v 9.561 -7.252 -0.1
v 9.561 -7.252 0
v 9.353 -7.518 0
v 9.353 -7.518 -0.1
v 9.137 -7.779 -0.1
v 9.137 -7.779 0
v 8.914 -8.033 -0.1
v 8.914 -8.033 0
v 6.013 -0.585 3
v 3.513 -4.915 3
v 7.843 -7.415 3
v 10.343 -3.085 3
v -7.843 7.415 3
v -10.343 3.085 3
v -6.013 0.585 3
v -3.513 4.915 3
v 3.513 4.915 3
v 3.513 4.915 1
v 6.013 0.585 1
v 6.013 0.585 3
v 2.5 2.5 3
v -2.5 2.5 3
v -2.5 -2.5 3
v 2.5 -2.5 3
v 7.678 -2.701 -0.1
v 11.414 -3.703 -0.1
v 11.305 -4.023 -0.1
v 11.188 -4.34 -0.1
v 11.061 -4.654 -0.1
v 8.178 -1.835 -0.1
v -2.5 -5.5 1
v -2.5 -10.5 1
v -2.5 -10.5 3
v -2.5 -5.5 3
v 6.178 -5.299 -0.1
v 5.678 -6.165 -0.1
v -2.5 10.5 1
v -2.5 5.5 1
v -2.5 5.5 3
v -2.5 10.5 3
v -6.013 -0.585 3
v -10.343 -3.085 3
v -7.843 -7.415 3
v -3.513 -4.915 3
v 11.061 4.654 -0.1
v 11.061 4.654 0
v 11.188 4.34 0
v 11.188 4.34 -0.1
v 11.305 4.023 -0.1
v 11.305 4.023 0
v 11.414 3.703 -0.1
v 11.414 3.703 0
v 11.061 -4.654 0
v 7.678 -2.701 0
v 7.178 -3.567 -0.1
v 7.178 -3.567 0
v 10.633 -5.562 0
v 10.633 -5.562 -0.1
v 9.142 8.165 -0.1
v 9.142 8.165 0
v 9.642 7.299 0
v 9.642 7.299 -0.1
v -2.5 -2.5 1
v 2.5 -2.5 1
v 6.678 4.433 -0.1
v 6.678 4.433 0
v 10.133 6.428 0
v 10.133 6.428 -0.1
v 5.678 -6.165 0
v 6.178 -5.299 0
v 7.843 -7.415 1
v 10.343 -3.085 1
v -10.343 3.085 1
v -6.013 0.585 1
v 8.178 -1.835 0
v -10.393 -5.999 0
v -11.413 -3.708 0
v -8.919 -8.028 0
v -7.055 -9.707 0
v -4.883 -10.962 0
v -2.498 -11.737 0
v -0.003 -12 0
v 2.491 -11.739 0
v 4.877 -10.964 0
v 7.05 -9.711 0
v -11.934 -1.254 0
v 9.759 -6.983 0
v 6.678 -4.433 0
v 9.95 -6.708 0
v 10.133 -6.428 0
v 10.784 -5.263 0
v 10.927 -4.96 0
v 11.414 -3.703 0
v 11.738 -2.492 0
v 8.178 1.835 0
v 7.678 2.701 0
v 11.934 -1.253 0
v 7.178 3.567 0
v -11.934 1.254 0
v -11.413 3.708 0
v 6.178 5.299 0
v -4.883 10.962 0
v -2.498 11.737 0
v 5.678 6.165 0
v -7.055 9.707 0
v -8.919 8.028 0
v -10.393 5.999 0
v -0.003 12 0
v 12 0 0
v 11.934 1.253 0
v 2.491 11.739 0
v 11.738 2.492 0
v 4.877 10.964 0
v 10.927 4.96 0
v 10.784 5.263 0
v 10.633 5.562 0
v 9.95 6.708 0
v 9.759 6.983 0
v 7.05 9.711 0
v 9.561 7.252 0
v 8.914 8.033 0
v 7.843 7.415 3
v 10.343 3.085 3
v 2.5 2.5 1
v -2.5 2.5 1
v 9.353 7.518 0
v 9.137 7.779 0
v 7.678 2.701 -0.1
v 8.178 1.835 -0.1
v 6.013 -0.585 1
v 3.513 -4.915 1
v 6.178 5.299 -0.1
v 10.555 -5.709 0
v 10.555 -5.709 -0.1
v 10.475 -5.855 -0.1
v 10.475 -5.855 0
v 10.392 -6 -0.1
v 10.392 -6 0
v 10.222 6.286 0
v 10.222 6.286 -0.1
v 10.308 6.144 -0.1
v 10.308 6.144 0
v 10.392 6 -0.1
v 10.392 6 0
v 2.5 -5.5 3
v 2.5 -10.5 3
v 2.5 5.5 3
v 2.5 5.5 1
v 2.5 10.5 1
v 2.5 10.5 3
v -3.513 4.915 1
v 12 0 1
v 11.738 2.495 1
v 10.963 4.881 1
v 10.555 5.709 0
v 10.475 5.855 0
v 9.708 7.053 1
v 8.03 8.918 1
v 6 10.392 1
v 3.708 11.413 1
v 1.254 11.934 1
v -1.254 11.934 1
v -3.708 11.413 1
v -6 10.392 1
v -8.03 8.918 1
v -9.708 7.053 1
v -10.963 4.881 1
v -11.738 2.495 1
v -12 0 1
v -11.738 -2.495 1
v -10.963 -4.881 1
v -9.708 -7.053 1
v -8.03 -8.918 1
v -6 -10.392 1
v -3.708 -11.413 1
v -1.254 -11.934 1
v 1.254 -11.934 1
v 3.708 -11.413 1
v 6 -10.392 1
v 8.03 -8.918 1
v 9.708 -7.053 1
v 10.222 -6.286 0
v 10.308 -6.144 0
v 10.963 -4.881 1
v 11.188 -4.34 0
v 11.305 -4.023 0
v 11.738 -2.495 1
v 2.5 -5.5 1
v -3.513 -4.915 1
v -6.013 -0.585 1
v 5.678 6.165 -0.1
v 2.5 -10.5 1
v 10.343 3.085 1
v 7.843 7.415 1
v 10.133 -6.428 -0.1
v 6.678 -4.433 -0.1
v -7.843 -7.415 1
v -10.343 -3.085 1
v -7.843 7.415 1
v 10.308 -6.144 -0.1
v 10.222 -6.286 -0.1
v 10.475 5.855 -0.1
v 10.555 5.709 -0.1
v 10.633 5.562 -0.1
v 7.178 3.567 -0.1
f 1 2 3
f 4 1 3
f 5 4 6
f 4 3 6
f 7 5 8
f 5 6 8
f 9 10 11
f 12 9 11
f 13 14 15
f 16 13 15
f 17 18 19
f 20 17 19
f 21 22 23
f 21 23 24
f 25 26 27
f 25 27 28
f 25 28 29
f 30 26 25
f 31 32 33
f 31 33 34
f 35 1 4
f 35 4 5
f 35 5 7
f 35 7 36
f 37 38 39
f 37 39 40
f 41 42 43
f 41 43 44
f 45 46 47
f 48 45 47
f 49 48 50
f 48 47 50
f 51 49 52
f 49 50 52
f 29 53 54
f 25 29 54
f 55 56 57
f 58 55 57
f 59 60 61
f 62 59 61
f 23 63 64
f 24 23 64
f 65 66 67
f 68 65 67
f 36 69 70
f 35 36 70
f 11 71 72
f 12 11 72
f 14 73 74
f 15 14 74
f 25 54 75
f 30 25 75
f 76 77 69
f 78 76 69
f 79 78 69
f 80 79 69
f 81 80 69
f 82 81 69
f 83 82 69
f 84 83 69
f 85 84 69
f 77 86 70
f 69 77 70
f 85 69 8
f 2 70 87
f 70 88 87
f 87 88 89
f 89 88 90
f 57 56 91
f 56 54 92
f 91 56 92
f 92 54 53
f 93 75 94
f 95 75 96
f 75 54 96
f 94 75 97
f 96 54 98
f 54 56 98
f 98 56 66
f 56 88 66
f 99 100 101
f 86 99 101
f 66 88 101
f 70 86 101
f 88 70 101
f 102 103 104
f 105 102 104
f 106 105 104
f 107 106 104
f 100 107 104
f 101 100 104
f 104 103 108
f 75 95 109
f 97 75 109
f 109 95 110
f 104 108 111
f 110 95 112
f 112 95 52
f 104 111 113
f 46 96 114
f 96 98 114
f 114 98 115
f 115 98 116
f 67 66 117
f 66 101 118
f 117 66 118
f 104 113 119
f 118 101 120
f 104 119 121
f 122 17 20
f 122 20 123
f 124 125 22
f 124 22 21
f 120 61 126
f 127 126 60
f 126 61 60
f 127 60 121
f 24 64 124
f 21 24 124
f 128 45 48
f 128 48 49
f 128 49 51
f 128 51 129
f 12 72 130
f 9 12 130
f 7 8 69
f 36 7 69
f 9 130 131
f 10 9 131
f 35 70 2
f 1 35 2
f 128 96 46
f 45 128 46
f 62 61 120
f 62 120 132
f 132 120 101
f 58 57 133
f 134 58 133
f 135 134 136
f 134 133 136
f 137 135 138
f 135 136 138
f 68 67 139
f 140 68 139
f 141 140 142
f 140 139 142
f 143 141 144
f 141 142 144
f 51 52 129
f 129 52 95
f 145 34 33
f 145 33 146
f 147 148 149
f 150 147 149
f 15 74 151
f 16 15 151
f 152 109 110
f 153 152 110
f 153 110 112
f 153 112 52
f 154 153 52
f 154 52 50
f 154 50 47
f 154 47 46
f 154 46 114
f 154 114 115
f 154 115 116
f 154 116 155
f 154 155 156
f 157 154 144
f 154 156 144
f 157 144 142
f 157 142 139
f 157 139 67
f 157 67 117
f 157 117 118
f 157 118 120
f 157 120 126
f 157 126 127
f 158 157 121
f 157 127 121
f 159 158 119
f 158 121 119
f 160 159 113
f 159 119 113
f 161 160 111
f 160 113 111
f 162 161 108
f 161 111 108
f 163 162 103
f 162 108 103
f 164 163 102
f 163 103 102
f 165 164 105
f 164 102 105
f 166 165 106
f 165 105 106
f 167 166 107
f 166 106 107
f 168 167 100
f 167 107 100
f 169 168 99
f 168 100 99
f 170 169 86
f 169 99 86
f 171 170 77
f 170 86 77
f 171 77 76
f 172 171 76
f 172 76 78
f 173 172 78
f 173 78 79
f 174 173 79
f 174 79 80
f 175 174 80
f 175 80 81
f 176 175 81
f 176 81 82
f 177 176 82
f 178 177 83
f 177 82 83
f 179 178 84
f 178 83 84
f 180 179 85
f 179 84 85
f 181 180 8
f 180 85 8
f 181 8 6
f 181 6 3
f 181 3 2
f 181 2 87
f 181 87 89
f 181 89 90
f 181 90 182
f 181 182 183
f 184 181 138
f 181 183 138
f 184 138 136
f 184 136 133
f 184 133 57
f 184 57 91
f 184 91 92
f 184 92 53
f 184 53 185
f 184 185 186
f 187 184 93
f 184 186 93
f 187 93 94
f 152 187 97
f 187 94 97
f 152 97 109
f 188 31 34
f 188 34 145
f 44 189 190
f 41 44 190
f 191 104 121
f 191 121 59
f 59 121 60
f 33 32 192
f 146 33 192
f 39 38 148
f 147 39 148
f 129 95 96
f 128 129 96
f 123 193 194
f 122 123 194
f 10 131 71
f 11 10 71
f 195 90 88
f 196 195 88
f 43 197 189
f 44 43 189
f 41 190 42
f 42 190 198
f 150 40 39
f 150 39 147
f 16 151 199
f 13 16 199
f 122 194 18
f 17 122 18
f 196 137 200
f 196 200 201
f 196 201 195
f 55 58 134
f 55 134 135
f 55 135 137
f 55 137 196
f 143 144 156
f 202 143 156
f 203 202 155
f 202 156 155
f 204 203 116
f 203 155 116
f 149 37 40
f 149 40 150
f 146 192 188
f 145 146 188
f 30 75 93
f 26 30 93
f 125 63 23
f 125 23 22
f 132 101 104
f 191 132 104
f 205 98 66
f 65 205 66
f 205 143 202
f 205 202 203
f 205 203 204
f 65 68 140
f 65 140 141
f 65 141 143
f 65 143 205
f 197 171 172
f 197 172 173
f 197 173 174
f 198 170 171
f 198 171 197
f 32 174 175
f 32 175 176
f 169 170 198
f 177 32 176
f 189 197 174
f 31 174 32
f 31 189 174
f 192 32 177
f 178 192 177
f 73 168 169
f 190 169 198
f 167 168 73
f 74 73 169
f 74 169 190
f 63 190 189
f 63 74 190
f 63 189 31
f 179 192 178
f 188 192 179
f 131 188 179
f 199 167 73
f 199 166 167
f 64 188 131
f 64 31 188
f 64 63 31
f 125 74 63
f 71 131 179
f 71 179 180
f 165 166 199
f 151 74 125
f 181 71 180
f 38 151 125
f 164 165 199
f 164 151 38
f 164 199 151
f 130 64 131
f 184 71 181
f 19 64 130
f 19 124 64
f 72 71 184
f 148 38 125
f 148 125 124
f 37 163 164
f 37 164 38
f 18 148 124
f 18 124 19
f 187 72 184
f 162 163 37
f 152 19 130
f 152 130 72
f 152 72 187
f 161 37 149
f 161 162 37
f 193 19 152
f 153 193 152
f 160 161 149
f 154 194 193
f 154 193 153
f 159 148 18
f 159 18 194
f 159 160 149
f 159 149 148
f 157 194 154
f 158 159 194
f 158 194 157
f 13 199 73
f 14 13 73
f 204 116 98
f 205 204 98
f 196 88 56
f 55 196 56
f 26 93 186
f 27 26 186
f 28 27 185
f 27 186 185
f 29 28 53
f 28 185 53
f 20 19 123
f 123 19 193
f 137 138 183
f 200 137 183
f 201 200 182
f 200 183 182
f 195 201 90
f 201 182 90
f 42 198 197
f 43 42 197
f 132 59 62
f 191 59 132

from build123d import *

# Parameters (mm, degrees)
CROQUIS1_R              = 12
SALIENTE_EXTRUIR1_DEPTH = 1
CROQUIS2_W              = 5
CROQUIS2_H              = 5
SALIENTE_EXTRUIR2_DEPTH = 2
SALIENTE_EXTRUIR3_DEPTH = 0.1


with BuildPart() as part:
    # Croquis1 → Saliente-Extruir1 (new body)
    with BuildSketch(Plane.XY):
        Circle(CROQUIS1_R)
    extrude(amount=SALIENTE_EXTRUIR1_DEPTH)

    # Croquis2 → Saliente-Extruir2 (add)
    with BuildSketch(Plane.XY.offset(1)):
        Rectangle(CROQUIS2_W, CROQUIS2_H)
        with Locations((0, -8)):
            Rectangle(CROQUIS2_W, CROQUIS2_H)
        with Locations((0, 8)):
            Rectangle(CROQUIS2_W, CROQUIS2_H)
        Polygon((-7.84326674, 7.415063509), (-10.34326674, 3.084936491), (-6.013139721, 0.584936491), (-3.513139721, 4.915063509), align=None)
        Polygon((-6.013139721, -0.584936491), (-10.34326674, -3.084936491), (-7.84326674, -7.415063509), (-3.513139721, -4.915063509), align=None)
        Polygon((6.013139721, -0.584936491), (3.513139721, -4.915063509), (7.84326674, -7.415063509), (10.34326674, -3.084936491), align=None)
        Polygon((7.84326674, 7.415063509), (3.513139721, 4.915063509), (6.013139721, 0.584936491), (10.34326674, 3.084936491), align=None)
    extrude(amount=SALIENTE_EXTRUIR2_DEPTH)

    # Croquis3 → Saliente-Extruir3 (add)
    with BuildSketch(Plane(origin=(0, 0, 0), x_dir=(-1, 0, 0), z_dir=(0, 0, -1))):
        with BuildLine():
            ThreePointArc((-9.560795314, -7.251978556), (-9.245794779, -7.649528018), (-8.914275675, -8.033410807))
            Line((-8.914275675, -8.033410807), (-5.67820323, -6.165063509))
            Line((-5.67820323, -6.165063509), (-6.17820323, -5.299038106))
            Line((-6.17820323, -5.299038106), (-9.560795314, -7.251978556))
        make_face()
        with BuildLine():
            Line((-7.17820323, -3.566987298), (-10.633279829, -5.561776702))
            ThreePointArc((-10.633279829, -5.561776702), (-10.515075861, -5.78214317), (-10.392305608, -5.999998679))
            ThreePointArc((-10.392305608, -5.999998679), (-10.265021594, -6.215249929), (-10.133279829, -6.427802106))
            Line((-10.133279829, -6.427802106), (-6.67820323, -4.433012702))
            Line((-6.67820323, -4.433012702), (-7.17820323, -3.566987298))
        make_face()
        with BuildLine():
            Line((-8.17820323, -1.834936491), (-11.414275675, -3.703283788))
            ThreePointArc((-11.414275675, -3.703283788), (-11.24758298, -4.182329148), (-11.060795314, -4.653902344))
            Line((-11.060795314, -4.653902344), (-7.67820323, -2.700961894))
            Line((-7.67820323, -2.700961894), (-8.17820323, -1.834936491))
        make_face()
        with BuildLine():
            Line((-7.67820323, 2.700961894), (-11.060795314, 4.653902344))
            ThreePointArc((-11.060795314, 4.653902344), (-11.24758298, 4.182329148), (-11.414275675, 3.703283788))
            Line((-11.414275675, 3.703283788), (-8.17820323, 1.834936491))
            Line((-8.17820323, 1.834936491), (-7.67820323, 2.700961894))
        make_face()
        with BuildLine():
            ThreePointArc((-10.133279829, 6.427802106), (-10.265021594, 6.215249929), (-10.392305608, 5.999998679))
            ThreePointArc((-10.392305608, 5.999998679), (-10.515075861, 5.78214317), (-10.633279829, 5.561776702))
            Line((-10.633279829, 5.561776702), (-7.17820323, 3.566987298))
            Line((-7.17820323, 3.566987298), (-6.67820323, 4.433012702))
            Line((-6.67820323, 4.433012702), (-10.133279829, 6.427802106))
        make_face()
        Polygon((-9.642304845, 7.299038106), (-6.17820323, 5.299038106), (-5.67820323, 6.165063509), (-9.142304845, 8.165063509), align=None)
    extrude(amount=SALIENTE_EXTRUIR3_DEPTH)


solid = part.part
